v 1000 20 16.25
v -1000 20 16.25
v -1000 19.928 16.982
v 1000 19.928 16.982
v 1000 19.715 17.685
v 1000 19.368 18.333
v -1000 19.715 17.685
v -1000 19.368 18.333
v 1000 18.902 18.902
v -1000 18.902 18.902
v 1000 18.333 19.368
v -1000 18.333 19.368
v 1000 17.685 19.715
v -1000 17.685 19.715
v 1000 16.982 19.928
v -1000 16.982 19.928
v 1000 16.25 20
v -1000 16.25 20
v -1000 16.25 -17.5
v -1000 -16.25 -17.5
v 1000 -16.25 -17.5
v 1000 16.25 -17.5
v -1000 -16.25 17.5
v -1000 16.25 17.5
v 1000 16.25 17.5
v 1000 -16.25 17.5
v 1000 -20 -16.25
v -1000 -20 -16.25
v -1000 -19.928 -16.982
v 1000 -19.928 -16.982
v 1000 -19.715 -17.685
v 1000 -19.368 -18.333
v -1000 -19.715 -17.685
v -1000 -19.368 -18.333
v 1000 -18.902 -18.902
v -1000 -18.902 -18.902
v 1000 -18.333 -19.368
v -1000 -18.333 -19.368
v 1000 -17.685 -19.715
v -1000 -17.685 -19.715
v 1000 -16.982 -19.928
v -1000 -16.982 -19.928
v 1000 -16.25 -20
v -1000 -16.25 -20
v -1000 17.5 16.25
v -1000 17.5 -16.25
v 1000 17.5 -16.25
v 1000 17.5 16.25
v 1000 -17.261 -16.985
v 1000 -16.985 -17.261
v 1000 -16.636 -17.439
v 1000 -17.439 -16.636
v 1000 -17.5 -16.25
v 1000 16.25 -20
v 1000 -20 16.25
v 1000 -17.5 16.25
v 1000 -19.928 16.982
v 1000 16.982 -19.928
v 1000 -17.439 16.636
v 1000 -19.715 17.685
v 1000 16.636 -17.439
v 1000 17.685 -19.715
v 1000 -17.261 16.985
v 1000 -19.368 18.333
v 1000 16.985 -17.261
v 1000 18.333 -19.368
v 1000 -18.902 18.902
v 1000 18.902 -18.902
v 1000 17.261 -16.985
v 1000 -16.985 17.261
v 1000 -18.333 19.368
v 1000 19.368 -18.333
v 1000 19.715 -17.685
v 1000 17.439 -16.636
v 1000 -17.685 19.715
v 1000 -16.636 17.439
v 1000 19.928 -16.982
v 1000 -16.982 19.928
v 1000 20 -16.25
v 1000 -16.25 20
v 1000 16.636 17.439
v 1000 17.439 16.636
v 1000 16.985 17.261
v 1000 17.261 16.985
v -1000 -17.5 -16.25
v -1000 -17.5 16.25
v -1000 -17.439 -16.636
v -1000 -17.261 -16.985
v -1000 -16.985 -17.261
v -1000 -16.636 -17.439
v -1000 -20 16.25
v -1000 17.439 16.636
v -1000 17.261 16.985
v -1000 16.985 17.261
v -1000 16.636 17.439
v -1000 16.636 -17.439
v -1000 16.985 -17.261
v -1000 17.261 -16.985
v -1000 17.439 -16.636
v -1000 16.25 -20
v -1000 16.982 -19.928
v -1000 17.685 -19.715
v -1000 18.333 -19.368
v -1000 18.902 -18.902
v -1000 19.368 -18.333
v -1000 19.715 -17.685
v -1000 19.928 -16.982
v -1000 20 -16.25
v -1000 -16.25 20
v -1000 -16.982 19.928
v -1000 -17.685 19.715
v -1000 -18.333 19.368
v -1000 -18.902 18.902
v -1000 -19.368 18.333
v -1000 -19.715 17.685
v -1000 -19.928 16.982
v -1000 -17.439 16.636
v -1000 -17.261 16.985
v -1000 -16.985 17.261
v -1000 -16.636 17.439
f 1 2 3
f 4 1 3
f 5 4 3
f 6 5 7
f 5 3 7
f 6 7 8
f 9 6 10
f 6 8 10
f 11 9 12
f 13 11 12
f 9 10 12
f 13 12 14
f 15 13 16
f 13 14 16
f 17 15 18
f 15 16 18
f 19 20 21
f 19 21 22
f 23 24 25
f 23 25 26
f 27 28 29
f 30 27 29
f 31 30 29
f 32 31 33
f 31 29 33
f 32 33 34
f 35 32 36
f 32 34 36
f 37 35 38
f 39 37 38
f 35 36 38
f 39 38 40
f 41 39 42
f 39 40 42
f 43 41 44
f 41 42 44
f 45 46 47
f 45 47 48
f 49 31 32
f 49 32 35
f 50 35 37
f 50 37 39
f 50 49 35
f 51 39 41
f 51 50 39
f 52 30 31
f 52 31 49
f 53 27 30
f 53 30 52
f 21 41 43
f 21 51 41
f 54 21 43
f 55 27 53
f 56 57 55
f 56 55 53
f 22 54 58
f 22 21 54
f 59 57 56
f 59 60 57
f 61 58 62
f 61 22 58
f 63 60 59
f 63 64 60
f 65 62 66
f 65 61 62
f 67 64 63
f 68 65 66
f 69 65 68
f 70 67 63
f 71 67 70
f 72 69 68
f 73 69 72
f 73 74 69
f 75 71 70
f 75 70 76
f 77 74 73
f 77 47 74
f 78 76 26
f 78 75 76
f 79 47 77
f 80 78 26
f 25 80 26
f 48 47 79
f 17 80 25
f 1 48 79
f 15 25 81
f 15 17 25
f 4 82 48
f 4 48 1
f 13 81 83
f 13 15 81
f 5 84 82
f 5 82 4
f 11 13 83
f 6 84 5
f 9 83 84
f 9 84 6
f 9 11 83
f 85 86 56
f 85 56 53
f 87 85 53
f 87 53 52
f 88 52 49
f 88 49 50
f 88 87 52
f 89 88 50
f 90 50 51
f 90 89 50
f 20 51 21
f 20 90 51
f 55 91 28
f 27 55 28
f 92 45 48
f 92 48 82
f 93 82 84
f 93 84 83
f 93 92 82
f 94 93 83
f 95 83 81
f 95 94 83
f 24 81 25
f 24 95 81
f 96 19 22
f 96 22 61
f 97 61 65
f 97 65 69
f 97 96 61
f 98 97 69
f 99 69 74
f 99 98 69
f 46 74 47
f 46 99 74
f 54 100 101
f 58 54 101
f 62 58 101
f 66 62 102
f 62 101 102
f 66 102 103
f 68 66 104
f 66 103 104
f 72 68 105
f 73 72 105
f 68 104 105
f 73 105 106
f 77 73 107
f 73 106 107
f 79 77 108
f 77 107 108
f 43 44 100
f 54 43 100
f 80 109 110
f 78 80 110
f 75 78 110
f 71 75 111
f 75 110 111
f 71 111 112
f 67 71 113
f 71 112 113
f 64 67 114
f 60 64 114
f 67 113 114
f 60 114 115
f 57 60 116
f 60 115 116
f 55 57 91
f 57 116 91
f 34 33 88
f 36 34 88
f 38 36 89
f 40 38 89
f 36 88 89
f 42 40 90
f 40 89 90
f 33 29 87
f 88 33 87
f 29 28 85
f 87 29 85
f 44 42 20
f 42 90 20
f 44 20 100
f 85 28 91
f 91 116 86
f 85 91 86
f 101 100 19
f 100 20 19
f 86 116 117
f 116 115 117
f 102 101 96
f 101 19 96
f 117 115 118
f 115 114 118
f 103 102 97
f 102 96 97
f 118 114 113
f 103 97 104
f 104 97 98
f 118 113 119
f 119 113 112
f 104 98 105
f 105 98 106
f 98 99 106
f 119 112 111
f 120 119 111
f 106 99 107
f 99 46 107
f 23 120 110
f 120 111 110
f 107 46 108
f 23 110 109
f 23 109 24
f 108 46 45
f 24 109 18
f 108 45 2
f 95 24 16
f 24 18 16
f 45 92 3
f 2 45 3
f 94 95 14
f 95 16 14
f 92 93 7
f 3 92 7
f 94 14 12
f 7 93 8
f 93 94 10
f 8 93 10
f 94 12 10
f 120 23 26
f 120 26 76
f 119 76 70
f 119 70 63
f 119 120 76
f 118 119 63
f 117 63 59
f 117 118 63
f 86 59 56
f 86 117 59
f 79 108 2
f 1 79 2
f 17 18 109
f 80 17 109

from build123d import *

# Parameters (mm, degrees)
BXBXS_8639_82_40_X_40_X_2_5_1_DEPTH = 2000


with BuildPart() as part:
    # Sketch1 → Труба bxbxs гост8639-82 40 X 40 X 2.5(1) (new body)
    with BuildSketch(Plane.YZ.offset(-1000)):
        with BuildLine():
            Line((-16.25, -20), (16.25, -20))
            ThreePointArc((16.25, -20), (18.901650429, -18.901650429), (20, -16.25))
            Line((20, -16.25), (20, 16.25))
            ThreePointArc((20, 16.25), (18.901650429, 18.901650429), (16.25, 20))
            Line((16.25, 20), (-16.25, 20))
            ThreePointArc((-16.25, 20), (-18.901650429, 18.901650429), (-20, 16.25))
            Line((-20, 16.25), (-20, -16.25))
            ThreePointArc((-20, -16.25), (-18.901650429, -18.901650429), (-16.25, -20))
        make_face()
        with BuildLine():
            Line((-16.25, -17.5), (16.25, -17.5))
            ThreePointArc((16.25, -17.5), (17.133883476, -17.133883476), (17.5, -16.25))
            Line((17.5, -16.25), (17.5, 16.25))
            ThreePointArc((17.5, 16.25), (17.133883476, 17.133883476), (16.25, 17.5))
            Line((16.25, 17.5), (-16.25, 17.5))
            ThreePointArc((-16.25, 17.5), (-17.133883476, 17.133883476), (-17.5, 16.25))
            Line((-17.5, 16.25), (-17.5, -16.25))
            ThreePointArc((-17.5, -16.25), (-17.133883476, -17.133883476), (-16.25, -17.5))
        make_face(mode=Mode.SUBTRACT)
    extrude(amount=BXBXS_8639_82_40_X_40_X_2_5_1_DEPTH)


solid = part.part
